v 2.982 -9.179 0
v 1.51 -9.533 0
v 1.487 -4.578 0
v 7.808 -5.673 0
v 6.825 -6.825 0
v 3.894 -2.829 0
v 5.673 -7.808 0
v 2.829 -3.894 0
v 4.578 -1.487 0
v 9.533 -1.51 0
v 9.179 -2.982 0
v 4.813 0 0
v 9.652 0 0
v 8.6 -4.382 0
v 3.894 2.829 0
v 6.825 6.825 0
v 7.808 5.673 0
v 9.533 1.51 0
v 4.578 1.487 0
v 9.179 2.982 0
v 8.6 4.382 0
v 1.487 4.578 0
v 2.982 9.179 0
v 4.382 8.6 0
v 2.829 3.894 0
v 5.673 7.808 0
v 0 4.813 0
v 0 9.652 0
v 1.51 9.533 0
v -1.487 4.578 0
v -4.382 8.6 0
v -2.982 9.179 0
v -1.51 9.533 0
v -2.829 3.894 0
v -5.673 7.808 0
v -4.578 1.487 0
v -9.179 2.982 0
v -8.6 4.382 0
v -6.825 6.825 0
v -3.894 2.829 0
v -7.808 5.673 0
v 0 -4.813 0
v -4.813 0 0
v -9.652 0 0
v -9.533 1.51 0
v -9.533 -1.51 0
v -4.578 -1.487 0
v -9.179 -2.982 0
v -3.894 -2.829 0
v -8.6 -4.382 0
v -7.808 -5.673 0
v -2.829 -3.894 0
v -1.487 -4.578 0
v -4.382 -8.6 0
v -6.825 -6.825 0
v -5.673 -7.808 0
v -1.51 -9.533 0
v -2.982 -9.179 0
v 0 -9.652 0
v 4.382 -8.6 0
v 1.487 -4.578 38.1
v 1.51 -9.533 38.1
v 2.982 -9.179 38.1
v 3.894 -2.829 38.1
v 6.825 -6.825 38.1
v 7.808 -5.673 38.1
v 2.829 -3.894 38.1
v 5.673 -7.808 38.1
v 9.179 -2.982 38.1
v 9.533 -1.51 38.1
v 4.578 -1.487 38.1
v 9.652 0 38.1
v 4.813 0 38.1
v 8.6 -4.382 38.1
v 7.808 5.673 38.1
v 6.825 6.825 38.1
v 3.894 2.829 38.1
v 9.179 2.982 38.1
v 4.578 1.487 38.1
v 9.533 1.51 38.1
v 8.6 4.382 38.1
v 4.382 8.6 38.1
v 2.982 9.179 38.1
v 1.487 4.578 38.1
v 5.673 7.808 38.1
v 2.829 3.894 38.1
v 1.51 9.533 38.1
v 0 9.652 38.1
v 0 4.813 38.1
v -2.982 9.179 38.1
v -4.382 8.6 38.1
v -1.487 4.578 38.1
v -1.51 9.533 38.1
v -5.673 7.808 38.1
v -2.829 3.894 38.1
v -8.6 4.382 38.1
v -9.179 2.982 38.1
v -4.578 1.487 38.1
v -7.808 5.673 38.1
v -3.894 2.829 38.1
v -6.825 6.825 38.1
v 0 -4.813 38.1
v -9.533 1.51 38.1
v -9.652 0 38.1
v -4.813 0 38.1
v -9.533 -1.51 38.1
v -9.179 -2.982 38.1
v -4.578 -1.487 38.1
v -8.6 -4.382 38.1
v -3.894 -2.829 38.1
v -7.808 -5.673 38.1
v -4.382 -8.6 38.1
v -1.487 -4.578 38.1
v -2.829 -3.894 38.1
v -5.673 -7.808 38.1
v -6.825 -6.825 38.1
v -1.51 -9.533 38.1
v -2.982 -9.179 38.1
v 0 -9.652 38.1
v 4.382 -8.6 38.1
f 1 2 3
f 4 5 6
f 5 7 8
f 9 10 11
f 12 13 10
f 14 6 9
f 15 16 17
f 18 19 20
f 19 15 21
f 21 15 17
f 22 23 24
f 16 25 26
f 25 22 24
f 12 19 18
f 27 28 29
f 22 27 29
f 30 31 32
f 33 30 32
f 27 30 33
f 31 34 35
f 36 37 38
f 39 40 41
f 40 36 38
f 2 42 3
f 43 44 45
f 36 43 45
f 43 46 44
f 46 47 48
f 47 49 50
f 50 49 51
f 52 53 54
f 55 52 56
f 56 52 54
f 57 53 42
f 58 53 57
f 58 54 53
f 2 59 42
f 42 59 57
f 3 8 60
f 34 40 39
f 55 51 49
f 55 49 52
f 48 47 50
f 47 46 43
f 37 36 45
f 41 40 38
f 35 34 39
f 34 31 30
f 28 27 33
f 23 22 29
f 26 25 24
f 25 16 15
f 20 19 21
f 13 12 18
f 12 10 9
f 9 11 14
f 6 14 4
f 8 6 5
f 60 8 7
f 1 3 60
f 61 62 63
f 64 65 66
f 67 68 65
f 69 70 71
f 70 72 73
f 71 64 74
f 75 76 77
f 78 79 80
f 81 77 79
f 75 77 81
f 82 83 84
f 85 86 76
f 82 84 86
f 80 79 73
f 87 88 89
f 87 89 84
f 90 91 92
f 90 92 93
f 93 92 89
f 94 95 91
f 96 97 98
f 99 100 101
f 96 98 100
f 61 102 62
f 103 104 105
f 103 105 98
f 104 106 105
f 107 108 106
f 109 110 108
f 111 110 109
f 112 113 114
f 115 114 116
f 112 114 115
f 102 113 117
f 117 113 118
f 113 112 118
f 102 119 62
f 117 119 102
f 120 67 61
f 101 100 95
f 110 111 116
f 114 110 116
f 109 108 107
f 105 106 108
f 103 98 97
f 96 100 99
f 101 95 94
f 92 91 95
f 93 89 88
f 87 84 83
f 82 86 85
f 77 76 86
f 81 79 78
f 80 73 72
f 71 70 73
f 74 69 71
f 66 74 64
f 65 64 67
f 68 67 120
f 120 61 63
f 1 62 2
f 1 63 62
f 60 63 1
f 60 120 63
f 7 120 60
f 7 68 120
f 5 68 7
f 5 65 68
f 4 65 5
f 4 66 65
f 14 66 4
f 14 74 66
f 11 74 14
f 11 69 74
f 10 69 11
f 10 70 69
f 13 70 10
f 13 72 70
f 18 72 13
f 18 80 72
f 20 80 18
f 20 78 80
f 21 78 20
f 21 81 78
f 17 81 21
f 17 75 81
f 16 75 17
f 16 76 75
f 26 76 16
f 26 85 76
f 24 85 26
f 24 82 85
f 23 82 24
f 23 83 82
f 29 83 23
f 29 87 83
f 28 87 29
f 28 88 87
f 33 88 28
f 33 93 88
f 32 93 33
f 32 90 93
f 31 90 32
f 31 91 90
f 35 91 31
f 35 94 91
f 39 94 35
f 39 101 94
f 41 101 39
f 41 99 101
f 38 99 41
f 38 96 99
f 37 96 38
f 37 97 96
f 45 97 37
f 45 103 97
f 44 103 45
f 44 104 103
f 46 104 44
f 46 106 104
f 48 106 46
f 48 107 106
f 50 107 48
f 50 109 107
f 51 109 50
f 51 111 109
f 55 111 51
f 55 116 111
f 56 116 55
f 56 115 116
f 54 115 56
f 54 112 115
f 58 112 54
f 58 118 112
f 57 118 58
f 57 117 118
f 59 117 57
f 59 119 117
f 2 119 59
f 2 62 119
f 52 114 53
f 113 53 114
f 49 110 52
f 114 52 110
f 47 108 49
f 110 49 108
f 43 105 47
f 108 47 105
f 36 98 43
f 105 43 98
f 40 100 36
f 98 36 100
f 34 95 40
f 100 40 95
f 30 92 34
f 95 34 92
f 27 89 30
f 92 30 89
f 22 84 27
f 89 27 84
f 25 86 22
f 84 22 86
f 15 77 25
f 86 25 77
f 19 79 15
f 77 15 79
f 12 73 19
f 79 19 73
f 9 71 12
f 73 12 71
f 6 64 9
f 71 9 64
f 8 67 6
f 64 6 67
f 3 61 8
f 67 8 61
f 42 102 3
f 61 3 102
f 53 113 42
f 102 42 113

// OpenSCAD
// file: ../../Meta/Manifold.scad
// Settings: Manifold Gap
MANIFOLD_GAP = 0.0001;

function ManifoldGap(n=1) = MANIFOLD_GAP*n;
// main file
use <../../Vitamins/Pipe.scad>;

//Spec_TubingThreeQuarterByFiveEighthInch
//Spec_PipeThreeQuarterInchSch80
//Spec_PipeThreeQuarterInchSch80Stainless
//Spec_PipeOneInchSch80
module PipeInsert2d(pipeSpec=Spec_PipeThreeQuarterInchSch80Stainless(),
                    pipeClearance=PipeClearanceSnug(),
                    length=1) {
  outsideRadius = PipeInnerRadius(pipe=pipeSpec, clearance=pipeClearance, clearanceSign=-1);
  
  difference() {
    circle(r=outsideRadius, $fn=PipeFn(pipeSpec));
    children();
  }
}

scale(25.4)
render()
linear_extrude(height=1.5)
PipeInsert2d(pipeClearance=undef)
circle(r=(3/8/2)+0.002, $fn=20);
